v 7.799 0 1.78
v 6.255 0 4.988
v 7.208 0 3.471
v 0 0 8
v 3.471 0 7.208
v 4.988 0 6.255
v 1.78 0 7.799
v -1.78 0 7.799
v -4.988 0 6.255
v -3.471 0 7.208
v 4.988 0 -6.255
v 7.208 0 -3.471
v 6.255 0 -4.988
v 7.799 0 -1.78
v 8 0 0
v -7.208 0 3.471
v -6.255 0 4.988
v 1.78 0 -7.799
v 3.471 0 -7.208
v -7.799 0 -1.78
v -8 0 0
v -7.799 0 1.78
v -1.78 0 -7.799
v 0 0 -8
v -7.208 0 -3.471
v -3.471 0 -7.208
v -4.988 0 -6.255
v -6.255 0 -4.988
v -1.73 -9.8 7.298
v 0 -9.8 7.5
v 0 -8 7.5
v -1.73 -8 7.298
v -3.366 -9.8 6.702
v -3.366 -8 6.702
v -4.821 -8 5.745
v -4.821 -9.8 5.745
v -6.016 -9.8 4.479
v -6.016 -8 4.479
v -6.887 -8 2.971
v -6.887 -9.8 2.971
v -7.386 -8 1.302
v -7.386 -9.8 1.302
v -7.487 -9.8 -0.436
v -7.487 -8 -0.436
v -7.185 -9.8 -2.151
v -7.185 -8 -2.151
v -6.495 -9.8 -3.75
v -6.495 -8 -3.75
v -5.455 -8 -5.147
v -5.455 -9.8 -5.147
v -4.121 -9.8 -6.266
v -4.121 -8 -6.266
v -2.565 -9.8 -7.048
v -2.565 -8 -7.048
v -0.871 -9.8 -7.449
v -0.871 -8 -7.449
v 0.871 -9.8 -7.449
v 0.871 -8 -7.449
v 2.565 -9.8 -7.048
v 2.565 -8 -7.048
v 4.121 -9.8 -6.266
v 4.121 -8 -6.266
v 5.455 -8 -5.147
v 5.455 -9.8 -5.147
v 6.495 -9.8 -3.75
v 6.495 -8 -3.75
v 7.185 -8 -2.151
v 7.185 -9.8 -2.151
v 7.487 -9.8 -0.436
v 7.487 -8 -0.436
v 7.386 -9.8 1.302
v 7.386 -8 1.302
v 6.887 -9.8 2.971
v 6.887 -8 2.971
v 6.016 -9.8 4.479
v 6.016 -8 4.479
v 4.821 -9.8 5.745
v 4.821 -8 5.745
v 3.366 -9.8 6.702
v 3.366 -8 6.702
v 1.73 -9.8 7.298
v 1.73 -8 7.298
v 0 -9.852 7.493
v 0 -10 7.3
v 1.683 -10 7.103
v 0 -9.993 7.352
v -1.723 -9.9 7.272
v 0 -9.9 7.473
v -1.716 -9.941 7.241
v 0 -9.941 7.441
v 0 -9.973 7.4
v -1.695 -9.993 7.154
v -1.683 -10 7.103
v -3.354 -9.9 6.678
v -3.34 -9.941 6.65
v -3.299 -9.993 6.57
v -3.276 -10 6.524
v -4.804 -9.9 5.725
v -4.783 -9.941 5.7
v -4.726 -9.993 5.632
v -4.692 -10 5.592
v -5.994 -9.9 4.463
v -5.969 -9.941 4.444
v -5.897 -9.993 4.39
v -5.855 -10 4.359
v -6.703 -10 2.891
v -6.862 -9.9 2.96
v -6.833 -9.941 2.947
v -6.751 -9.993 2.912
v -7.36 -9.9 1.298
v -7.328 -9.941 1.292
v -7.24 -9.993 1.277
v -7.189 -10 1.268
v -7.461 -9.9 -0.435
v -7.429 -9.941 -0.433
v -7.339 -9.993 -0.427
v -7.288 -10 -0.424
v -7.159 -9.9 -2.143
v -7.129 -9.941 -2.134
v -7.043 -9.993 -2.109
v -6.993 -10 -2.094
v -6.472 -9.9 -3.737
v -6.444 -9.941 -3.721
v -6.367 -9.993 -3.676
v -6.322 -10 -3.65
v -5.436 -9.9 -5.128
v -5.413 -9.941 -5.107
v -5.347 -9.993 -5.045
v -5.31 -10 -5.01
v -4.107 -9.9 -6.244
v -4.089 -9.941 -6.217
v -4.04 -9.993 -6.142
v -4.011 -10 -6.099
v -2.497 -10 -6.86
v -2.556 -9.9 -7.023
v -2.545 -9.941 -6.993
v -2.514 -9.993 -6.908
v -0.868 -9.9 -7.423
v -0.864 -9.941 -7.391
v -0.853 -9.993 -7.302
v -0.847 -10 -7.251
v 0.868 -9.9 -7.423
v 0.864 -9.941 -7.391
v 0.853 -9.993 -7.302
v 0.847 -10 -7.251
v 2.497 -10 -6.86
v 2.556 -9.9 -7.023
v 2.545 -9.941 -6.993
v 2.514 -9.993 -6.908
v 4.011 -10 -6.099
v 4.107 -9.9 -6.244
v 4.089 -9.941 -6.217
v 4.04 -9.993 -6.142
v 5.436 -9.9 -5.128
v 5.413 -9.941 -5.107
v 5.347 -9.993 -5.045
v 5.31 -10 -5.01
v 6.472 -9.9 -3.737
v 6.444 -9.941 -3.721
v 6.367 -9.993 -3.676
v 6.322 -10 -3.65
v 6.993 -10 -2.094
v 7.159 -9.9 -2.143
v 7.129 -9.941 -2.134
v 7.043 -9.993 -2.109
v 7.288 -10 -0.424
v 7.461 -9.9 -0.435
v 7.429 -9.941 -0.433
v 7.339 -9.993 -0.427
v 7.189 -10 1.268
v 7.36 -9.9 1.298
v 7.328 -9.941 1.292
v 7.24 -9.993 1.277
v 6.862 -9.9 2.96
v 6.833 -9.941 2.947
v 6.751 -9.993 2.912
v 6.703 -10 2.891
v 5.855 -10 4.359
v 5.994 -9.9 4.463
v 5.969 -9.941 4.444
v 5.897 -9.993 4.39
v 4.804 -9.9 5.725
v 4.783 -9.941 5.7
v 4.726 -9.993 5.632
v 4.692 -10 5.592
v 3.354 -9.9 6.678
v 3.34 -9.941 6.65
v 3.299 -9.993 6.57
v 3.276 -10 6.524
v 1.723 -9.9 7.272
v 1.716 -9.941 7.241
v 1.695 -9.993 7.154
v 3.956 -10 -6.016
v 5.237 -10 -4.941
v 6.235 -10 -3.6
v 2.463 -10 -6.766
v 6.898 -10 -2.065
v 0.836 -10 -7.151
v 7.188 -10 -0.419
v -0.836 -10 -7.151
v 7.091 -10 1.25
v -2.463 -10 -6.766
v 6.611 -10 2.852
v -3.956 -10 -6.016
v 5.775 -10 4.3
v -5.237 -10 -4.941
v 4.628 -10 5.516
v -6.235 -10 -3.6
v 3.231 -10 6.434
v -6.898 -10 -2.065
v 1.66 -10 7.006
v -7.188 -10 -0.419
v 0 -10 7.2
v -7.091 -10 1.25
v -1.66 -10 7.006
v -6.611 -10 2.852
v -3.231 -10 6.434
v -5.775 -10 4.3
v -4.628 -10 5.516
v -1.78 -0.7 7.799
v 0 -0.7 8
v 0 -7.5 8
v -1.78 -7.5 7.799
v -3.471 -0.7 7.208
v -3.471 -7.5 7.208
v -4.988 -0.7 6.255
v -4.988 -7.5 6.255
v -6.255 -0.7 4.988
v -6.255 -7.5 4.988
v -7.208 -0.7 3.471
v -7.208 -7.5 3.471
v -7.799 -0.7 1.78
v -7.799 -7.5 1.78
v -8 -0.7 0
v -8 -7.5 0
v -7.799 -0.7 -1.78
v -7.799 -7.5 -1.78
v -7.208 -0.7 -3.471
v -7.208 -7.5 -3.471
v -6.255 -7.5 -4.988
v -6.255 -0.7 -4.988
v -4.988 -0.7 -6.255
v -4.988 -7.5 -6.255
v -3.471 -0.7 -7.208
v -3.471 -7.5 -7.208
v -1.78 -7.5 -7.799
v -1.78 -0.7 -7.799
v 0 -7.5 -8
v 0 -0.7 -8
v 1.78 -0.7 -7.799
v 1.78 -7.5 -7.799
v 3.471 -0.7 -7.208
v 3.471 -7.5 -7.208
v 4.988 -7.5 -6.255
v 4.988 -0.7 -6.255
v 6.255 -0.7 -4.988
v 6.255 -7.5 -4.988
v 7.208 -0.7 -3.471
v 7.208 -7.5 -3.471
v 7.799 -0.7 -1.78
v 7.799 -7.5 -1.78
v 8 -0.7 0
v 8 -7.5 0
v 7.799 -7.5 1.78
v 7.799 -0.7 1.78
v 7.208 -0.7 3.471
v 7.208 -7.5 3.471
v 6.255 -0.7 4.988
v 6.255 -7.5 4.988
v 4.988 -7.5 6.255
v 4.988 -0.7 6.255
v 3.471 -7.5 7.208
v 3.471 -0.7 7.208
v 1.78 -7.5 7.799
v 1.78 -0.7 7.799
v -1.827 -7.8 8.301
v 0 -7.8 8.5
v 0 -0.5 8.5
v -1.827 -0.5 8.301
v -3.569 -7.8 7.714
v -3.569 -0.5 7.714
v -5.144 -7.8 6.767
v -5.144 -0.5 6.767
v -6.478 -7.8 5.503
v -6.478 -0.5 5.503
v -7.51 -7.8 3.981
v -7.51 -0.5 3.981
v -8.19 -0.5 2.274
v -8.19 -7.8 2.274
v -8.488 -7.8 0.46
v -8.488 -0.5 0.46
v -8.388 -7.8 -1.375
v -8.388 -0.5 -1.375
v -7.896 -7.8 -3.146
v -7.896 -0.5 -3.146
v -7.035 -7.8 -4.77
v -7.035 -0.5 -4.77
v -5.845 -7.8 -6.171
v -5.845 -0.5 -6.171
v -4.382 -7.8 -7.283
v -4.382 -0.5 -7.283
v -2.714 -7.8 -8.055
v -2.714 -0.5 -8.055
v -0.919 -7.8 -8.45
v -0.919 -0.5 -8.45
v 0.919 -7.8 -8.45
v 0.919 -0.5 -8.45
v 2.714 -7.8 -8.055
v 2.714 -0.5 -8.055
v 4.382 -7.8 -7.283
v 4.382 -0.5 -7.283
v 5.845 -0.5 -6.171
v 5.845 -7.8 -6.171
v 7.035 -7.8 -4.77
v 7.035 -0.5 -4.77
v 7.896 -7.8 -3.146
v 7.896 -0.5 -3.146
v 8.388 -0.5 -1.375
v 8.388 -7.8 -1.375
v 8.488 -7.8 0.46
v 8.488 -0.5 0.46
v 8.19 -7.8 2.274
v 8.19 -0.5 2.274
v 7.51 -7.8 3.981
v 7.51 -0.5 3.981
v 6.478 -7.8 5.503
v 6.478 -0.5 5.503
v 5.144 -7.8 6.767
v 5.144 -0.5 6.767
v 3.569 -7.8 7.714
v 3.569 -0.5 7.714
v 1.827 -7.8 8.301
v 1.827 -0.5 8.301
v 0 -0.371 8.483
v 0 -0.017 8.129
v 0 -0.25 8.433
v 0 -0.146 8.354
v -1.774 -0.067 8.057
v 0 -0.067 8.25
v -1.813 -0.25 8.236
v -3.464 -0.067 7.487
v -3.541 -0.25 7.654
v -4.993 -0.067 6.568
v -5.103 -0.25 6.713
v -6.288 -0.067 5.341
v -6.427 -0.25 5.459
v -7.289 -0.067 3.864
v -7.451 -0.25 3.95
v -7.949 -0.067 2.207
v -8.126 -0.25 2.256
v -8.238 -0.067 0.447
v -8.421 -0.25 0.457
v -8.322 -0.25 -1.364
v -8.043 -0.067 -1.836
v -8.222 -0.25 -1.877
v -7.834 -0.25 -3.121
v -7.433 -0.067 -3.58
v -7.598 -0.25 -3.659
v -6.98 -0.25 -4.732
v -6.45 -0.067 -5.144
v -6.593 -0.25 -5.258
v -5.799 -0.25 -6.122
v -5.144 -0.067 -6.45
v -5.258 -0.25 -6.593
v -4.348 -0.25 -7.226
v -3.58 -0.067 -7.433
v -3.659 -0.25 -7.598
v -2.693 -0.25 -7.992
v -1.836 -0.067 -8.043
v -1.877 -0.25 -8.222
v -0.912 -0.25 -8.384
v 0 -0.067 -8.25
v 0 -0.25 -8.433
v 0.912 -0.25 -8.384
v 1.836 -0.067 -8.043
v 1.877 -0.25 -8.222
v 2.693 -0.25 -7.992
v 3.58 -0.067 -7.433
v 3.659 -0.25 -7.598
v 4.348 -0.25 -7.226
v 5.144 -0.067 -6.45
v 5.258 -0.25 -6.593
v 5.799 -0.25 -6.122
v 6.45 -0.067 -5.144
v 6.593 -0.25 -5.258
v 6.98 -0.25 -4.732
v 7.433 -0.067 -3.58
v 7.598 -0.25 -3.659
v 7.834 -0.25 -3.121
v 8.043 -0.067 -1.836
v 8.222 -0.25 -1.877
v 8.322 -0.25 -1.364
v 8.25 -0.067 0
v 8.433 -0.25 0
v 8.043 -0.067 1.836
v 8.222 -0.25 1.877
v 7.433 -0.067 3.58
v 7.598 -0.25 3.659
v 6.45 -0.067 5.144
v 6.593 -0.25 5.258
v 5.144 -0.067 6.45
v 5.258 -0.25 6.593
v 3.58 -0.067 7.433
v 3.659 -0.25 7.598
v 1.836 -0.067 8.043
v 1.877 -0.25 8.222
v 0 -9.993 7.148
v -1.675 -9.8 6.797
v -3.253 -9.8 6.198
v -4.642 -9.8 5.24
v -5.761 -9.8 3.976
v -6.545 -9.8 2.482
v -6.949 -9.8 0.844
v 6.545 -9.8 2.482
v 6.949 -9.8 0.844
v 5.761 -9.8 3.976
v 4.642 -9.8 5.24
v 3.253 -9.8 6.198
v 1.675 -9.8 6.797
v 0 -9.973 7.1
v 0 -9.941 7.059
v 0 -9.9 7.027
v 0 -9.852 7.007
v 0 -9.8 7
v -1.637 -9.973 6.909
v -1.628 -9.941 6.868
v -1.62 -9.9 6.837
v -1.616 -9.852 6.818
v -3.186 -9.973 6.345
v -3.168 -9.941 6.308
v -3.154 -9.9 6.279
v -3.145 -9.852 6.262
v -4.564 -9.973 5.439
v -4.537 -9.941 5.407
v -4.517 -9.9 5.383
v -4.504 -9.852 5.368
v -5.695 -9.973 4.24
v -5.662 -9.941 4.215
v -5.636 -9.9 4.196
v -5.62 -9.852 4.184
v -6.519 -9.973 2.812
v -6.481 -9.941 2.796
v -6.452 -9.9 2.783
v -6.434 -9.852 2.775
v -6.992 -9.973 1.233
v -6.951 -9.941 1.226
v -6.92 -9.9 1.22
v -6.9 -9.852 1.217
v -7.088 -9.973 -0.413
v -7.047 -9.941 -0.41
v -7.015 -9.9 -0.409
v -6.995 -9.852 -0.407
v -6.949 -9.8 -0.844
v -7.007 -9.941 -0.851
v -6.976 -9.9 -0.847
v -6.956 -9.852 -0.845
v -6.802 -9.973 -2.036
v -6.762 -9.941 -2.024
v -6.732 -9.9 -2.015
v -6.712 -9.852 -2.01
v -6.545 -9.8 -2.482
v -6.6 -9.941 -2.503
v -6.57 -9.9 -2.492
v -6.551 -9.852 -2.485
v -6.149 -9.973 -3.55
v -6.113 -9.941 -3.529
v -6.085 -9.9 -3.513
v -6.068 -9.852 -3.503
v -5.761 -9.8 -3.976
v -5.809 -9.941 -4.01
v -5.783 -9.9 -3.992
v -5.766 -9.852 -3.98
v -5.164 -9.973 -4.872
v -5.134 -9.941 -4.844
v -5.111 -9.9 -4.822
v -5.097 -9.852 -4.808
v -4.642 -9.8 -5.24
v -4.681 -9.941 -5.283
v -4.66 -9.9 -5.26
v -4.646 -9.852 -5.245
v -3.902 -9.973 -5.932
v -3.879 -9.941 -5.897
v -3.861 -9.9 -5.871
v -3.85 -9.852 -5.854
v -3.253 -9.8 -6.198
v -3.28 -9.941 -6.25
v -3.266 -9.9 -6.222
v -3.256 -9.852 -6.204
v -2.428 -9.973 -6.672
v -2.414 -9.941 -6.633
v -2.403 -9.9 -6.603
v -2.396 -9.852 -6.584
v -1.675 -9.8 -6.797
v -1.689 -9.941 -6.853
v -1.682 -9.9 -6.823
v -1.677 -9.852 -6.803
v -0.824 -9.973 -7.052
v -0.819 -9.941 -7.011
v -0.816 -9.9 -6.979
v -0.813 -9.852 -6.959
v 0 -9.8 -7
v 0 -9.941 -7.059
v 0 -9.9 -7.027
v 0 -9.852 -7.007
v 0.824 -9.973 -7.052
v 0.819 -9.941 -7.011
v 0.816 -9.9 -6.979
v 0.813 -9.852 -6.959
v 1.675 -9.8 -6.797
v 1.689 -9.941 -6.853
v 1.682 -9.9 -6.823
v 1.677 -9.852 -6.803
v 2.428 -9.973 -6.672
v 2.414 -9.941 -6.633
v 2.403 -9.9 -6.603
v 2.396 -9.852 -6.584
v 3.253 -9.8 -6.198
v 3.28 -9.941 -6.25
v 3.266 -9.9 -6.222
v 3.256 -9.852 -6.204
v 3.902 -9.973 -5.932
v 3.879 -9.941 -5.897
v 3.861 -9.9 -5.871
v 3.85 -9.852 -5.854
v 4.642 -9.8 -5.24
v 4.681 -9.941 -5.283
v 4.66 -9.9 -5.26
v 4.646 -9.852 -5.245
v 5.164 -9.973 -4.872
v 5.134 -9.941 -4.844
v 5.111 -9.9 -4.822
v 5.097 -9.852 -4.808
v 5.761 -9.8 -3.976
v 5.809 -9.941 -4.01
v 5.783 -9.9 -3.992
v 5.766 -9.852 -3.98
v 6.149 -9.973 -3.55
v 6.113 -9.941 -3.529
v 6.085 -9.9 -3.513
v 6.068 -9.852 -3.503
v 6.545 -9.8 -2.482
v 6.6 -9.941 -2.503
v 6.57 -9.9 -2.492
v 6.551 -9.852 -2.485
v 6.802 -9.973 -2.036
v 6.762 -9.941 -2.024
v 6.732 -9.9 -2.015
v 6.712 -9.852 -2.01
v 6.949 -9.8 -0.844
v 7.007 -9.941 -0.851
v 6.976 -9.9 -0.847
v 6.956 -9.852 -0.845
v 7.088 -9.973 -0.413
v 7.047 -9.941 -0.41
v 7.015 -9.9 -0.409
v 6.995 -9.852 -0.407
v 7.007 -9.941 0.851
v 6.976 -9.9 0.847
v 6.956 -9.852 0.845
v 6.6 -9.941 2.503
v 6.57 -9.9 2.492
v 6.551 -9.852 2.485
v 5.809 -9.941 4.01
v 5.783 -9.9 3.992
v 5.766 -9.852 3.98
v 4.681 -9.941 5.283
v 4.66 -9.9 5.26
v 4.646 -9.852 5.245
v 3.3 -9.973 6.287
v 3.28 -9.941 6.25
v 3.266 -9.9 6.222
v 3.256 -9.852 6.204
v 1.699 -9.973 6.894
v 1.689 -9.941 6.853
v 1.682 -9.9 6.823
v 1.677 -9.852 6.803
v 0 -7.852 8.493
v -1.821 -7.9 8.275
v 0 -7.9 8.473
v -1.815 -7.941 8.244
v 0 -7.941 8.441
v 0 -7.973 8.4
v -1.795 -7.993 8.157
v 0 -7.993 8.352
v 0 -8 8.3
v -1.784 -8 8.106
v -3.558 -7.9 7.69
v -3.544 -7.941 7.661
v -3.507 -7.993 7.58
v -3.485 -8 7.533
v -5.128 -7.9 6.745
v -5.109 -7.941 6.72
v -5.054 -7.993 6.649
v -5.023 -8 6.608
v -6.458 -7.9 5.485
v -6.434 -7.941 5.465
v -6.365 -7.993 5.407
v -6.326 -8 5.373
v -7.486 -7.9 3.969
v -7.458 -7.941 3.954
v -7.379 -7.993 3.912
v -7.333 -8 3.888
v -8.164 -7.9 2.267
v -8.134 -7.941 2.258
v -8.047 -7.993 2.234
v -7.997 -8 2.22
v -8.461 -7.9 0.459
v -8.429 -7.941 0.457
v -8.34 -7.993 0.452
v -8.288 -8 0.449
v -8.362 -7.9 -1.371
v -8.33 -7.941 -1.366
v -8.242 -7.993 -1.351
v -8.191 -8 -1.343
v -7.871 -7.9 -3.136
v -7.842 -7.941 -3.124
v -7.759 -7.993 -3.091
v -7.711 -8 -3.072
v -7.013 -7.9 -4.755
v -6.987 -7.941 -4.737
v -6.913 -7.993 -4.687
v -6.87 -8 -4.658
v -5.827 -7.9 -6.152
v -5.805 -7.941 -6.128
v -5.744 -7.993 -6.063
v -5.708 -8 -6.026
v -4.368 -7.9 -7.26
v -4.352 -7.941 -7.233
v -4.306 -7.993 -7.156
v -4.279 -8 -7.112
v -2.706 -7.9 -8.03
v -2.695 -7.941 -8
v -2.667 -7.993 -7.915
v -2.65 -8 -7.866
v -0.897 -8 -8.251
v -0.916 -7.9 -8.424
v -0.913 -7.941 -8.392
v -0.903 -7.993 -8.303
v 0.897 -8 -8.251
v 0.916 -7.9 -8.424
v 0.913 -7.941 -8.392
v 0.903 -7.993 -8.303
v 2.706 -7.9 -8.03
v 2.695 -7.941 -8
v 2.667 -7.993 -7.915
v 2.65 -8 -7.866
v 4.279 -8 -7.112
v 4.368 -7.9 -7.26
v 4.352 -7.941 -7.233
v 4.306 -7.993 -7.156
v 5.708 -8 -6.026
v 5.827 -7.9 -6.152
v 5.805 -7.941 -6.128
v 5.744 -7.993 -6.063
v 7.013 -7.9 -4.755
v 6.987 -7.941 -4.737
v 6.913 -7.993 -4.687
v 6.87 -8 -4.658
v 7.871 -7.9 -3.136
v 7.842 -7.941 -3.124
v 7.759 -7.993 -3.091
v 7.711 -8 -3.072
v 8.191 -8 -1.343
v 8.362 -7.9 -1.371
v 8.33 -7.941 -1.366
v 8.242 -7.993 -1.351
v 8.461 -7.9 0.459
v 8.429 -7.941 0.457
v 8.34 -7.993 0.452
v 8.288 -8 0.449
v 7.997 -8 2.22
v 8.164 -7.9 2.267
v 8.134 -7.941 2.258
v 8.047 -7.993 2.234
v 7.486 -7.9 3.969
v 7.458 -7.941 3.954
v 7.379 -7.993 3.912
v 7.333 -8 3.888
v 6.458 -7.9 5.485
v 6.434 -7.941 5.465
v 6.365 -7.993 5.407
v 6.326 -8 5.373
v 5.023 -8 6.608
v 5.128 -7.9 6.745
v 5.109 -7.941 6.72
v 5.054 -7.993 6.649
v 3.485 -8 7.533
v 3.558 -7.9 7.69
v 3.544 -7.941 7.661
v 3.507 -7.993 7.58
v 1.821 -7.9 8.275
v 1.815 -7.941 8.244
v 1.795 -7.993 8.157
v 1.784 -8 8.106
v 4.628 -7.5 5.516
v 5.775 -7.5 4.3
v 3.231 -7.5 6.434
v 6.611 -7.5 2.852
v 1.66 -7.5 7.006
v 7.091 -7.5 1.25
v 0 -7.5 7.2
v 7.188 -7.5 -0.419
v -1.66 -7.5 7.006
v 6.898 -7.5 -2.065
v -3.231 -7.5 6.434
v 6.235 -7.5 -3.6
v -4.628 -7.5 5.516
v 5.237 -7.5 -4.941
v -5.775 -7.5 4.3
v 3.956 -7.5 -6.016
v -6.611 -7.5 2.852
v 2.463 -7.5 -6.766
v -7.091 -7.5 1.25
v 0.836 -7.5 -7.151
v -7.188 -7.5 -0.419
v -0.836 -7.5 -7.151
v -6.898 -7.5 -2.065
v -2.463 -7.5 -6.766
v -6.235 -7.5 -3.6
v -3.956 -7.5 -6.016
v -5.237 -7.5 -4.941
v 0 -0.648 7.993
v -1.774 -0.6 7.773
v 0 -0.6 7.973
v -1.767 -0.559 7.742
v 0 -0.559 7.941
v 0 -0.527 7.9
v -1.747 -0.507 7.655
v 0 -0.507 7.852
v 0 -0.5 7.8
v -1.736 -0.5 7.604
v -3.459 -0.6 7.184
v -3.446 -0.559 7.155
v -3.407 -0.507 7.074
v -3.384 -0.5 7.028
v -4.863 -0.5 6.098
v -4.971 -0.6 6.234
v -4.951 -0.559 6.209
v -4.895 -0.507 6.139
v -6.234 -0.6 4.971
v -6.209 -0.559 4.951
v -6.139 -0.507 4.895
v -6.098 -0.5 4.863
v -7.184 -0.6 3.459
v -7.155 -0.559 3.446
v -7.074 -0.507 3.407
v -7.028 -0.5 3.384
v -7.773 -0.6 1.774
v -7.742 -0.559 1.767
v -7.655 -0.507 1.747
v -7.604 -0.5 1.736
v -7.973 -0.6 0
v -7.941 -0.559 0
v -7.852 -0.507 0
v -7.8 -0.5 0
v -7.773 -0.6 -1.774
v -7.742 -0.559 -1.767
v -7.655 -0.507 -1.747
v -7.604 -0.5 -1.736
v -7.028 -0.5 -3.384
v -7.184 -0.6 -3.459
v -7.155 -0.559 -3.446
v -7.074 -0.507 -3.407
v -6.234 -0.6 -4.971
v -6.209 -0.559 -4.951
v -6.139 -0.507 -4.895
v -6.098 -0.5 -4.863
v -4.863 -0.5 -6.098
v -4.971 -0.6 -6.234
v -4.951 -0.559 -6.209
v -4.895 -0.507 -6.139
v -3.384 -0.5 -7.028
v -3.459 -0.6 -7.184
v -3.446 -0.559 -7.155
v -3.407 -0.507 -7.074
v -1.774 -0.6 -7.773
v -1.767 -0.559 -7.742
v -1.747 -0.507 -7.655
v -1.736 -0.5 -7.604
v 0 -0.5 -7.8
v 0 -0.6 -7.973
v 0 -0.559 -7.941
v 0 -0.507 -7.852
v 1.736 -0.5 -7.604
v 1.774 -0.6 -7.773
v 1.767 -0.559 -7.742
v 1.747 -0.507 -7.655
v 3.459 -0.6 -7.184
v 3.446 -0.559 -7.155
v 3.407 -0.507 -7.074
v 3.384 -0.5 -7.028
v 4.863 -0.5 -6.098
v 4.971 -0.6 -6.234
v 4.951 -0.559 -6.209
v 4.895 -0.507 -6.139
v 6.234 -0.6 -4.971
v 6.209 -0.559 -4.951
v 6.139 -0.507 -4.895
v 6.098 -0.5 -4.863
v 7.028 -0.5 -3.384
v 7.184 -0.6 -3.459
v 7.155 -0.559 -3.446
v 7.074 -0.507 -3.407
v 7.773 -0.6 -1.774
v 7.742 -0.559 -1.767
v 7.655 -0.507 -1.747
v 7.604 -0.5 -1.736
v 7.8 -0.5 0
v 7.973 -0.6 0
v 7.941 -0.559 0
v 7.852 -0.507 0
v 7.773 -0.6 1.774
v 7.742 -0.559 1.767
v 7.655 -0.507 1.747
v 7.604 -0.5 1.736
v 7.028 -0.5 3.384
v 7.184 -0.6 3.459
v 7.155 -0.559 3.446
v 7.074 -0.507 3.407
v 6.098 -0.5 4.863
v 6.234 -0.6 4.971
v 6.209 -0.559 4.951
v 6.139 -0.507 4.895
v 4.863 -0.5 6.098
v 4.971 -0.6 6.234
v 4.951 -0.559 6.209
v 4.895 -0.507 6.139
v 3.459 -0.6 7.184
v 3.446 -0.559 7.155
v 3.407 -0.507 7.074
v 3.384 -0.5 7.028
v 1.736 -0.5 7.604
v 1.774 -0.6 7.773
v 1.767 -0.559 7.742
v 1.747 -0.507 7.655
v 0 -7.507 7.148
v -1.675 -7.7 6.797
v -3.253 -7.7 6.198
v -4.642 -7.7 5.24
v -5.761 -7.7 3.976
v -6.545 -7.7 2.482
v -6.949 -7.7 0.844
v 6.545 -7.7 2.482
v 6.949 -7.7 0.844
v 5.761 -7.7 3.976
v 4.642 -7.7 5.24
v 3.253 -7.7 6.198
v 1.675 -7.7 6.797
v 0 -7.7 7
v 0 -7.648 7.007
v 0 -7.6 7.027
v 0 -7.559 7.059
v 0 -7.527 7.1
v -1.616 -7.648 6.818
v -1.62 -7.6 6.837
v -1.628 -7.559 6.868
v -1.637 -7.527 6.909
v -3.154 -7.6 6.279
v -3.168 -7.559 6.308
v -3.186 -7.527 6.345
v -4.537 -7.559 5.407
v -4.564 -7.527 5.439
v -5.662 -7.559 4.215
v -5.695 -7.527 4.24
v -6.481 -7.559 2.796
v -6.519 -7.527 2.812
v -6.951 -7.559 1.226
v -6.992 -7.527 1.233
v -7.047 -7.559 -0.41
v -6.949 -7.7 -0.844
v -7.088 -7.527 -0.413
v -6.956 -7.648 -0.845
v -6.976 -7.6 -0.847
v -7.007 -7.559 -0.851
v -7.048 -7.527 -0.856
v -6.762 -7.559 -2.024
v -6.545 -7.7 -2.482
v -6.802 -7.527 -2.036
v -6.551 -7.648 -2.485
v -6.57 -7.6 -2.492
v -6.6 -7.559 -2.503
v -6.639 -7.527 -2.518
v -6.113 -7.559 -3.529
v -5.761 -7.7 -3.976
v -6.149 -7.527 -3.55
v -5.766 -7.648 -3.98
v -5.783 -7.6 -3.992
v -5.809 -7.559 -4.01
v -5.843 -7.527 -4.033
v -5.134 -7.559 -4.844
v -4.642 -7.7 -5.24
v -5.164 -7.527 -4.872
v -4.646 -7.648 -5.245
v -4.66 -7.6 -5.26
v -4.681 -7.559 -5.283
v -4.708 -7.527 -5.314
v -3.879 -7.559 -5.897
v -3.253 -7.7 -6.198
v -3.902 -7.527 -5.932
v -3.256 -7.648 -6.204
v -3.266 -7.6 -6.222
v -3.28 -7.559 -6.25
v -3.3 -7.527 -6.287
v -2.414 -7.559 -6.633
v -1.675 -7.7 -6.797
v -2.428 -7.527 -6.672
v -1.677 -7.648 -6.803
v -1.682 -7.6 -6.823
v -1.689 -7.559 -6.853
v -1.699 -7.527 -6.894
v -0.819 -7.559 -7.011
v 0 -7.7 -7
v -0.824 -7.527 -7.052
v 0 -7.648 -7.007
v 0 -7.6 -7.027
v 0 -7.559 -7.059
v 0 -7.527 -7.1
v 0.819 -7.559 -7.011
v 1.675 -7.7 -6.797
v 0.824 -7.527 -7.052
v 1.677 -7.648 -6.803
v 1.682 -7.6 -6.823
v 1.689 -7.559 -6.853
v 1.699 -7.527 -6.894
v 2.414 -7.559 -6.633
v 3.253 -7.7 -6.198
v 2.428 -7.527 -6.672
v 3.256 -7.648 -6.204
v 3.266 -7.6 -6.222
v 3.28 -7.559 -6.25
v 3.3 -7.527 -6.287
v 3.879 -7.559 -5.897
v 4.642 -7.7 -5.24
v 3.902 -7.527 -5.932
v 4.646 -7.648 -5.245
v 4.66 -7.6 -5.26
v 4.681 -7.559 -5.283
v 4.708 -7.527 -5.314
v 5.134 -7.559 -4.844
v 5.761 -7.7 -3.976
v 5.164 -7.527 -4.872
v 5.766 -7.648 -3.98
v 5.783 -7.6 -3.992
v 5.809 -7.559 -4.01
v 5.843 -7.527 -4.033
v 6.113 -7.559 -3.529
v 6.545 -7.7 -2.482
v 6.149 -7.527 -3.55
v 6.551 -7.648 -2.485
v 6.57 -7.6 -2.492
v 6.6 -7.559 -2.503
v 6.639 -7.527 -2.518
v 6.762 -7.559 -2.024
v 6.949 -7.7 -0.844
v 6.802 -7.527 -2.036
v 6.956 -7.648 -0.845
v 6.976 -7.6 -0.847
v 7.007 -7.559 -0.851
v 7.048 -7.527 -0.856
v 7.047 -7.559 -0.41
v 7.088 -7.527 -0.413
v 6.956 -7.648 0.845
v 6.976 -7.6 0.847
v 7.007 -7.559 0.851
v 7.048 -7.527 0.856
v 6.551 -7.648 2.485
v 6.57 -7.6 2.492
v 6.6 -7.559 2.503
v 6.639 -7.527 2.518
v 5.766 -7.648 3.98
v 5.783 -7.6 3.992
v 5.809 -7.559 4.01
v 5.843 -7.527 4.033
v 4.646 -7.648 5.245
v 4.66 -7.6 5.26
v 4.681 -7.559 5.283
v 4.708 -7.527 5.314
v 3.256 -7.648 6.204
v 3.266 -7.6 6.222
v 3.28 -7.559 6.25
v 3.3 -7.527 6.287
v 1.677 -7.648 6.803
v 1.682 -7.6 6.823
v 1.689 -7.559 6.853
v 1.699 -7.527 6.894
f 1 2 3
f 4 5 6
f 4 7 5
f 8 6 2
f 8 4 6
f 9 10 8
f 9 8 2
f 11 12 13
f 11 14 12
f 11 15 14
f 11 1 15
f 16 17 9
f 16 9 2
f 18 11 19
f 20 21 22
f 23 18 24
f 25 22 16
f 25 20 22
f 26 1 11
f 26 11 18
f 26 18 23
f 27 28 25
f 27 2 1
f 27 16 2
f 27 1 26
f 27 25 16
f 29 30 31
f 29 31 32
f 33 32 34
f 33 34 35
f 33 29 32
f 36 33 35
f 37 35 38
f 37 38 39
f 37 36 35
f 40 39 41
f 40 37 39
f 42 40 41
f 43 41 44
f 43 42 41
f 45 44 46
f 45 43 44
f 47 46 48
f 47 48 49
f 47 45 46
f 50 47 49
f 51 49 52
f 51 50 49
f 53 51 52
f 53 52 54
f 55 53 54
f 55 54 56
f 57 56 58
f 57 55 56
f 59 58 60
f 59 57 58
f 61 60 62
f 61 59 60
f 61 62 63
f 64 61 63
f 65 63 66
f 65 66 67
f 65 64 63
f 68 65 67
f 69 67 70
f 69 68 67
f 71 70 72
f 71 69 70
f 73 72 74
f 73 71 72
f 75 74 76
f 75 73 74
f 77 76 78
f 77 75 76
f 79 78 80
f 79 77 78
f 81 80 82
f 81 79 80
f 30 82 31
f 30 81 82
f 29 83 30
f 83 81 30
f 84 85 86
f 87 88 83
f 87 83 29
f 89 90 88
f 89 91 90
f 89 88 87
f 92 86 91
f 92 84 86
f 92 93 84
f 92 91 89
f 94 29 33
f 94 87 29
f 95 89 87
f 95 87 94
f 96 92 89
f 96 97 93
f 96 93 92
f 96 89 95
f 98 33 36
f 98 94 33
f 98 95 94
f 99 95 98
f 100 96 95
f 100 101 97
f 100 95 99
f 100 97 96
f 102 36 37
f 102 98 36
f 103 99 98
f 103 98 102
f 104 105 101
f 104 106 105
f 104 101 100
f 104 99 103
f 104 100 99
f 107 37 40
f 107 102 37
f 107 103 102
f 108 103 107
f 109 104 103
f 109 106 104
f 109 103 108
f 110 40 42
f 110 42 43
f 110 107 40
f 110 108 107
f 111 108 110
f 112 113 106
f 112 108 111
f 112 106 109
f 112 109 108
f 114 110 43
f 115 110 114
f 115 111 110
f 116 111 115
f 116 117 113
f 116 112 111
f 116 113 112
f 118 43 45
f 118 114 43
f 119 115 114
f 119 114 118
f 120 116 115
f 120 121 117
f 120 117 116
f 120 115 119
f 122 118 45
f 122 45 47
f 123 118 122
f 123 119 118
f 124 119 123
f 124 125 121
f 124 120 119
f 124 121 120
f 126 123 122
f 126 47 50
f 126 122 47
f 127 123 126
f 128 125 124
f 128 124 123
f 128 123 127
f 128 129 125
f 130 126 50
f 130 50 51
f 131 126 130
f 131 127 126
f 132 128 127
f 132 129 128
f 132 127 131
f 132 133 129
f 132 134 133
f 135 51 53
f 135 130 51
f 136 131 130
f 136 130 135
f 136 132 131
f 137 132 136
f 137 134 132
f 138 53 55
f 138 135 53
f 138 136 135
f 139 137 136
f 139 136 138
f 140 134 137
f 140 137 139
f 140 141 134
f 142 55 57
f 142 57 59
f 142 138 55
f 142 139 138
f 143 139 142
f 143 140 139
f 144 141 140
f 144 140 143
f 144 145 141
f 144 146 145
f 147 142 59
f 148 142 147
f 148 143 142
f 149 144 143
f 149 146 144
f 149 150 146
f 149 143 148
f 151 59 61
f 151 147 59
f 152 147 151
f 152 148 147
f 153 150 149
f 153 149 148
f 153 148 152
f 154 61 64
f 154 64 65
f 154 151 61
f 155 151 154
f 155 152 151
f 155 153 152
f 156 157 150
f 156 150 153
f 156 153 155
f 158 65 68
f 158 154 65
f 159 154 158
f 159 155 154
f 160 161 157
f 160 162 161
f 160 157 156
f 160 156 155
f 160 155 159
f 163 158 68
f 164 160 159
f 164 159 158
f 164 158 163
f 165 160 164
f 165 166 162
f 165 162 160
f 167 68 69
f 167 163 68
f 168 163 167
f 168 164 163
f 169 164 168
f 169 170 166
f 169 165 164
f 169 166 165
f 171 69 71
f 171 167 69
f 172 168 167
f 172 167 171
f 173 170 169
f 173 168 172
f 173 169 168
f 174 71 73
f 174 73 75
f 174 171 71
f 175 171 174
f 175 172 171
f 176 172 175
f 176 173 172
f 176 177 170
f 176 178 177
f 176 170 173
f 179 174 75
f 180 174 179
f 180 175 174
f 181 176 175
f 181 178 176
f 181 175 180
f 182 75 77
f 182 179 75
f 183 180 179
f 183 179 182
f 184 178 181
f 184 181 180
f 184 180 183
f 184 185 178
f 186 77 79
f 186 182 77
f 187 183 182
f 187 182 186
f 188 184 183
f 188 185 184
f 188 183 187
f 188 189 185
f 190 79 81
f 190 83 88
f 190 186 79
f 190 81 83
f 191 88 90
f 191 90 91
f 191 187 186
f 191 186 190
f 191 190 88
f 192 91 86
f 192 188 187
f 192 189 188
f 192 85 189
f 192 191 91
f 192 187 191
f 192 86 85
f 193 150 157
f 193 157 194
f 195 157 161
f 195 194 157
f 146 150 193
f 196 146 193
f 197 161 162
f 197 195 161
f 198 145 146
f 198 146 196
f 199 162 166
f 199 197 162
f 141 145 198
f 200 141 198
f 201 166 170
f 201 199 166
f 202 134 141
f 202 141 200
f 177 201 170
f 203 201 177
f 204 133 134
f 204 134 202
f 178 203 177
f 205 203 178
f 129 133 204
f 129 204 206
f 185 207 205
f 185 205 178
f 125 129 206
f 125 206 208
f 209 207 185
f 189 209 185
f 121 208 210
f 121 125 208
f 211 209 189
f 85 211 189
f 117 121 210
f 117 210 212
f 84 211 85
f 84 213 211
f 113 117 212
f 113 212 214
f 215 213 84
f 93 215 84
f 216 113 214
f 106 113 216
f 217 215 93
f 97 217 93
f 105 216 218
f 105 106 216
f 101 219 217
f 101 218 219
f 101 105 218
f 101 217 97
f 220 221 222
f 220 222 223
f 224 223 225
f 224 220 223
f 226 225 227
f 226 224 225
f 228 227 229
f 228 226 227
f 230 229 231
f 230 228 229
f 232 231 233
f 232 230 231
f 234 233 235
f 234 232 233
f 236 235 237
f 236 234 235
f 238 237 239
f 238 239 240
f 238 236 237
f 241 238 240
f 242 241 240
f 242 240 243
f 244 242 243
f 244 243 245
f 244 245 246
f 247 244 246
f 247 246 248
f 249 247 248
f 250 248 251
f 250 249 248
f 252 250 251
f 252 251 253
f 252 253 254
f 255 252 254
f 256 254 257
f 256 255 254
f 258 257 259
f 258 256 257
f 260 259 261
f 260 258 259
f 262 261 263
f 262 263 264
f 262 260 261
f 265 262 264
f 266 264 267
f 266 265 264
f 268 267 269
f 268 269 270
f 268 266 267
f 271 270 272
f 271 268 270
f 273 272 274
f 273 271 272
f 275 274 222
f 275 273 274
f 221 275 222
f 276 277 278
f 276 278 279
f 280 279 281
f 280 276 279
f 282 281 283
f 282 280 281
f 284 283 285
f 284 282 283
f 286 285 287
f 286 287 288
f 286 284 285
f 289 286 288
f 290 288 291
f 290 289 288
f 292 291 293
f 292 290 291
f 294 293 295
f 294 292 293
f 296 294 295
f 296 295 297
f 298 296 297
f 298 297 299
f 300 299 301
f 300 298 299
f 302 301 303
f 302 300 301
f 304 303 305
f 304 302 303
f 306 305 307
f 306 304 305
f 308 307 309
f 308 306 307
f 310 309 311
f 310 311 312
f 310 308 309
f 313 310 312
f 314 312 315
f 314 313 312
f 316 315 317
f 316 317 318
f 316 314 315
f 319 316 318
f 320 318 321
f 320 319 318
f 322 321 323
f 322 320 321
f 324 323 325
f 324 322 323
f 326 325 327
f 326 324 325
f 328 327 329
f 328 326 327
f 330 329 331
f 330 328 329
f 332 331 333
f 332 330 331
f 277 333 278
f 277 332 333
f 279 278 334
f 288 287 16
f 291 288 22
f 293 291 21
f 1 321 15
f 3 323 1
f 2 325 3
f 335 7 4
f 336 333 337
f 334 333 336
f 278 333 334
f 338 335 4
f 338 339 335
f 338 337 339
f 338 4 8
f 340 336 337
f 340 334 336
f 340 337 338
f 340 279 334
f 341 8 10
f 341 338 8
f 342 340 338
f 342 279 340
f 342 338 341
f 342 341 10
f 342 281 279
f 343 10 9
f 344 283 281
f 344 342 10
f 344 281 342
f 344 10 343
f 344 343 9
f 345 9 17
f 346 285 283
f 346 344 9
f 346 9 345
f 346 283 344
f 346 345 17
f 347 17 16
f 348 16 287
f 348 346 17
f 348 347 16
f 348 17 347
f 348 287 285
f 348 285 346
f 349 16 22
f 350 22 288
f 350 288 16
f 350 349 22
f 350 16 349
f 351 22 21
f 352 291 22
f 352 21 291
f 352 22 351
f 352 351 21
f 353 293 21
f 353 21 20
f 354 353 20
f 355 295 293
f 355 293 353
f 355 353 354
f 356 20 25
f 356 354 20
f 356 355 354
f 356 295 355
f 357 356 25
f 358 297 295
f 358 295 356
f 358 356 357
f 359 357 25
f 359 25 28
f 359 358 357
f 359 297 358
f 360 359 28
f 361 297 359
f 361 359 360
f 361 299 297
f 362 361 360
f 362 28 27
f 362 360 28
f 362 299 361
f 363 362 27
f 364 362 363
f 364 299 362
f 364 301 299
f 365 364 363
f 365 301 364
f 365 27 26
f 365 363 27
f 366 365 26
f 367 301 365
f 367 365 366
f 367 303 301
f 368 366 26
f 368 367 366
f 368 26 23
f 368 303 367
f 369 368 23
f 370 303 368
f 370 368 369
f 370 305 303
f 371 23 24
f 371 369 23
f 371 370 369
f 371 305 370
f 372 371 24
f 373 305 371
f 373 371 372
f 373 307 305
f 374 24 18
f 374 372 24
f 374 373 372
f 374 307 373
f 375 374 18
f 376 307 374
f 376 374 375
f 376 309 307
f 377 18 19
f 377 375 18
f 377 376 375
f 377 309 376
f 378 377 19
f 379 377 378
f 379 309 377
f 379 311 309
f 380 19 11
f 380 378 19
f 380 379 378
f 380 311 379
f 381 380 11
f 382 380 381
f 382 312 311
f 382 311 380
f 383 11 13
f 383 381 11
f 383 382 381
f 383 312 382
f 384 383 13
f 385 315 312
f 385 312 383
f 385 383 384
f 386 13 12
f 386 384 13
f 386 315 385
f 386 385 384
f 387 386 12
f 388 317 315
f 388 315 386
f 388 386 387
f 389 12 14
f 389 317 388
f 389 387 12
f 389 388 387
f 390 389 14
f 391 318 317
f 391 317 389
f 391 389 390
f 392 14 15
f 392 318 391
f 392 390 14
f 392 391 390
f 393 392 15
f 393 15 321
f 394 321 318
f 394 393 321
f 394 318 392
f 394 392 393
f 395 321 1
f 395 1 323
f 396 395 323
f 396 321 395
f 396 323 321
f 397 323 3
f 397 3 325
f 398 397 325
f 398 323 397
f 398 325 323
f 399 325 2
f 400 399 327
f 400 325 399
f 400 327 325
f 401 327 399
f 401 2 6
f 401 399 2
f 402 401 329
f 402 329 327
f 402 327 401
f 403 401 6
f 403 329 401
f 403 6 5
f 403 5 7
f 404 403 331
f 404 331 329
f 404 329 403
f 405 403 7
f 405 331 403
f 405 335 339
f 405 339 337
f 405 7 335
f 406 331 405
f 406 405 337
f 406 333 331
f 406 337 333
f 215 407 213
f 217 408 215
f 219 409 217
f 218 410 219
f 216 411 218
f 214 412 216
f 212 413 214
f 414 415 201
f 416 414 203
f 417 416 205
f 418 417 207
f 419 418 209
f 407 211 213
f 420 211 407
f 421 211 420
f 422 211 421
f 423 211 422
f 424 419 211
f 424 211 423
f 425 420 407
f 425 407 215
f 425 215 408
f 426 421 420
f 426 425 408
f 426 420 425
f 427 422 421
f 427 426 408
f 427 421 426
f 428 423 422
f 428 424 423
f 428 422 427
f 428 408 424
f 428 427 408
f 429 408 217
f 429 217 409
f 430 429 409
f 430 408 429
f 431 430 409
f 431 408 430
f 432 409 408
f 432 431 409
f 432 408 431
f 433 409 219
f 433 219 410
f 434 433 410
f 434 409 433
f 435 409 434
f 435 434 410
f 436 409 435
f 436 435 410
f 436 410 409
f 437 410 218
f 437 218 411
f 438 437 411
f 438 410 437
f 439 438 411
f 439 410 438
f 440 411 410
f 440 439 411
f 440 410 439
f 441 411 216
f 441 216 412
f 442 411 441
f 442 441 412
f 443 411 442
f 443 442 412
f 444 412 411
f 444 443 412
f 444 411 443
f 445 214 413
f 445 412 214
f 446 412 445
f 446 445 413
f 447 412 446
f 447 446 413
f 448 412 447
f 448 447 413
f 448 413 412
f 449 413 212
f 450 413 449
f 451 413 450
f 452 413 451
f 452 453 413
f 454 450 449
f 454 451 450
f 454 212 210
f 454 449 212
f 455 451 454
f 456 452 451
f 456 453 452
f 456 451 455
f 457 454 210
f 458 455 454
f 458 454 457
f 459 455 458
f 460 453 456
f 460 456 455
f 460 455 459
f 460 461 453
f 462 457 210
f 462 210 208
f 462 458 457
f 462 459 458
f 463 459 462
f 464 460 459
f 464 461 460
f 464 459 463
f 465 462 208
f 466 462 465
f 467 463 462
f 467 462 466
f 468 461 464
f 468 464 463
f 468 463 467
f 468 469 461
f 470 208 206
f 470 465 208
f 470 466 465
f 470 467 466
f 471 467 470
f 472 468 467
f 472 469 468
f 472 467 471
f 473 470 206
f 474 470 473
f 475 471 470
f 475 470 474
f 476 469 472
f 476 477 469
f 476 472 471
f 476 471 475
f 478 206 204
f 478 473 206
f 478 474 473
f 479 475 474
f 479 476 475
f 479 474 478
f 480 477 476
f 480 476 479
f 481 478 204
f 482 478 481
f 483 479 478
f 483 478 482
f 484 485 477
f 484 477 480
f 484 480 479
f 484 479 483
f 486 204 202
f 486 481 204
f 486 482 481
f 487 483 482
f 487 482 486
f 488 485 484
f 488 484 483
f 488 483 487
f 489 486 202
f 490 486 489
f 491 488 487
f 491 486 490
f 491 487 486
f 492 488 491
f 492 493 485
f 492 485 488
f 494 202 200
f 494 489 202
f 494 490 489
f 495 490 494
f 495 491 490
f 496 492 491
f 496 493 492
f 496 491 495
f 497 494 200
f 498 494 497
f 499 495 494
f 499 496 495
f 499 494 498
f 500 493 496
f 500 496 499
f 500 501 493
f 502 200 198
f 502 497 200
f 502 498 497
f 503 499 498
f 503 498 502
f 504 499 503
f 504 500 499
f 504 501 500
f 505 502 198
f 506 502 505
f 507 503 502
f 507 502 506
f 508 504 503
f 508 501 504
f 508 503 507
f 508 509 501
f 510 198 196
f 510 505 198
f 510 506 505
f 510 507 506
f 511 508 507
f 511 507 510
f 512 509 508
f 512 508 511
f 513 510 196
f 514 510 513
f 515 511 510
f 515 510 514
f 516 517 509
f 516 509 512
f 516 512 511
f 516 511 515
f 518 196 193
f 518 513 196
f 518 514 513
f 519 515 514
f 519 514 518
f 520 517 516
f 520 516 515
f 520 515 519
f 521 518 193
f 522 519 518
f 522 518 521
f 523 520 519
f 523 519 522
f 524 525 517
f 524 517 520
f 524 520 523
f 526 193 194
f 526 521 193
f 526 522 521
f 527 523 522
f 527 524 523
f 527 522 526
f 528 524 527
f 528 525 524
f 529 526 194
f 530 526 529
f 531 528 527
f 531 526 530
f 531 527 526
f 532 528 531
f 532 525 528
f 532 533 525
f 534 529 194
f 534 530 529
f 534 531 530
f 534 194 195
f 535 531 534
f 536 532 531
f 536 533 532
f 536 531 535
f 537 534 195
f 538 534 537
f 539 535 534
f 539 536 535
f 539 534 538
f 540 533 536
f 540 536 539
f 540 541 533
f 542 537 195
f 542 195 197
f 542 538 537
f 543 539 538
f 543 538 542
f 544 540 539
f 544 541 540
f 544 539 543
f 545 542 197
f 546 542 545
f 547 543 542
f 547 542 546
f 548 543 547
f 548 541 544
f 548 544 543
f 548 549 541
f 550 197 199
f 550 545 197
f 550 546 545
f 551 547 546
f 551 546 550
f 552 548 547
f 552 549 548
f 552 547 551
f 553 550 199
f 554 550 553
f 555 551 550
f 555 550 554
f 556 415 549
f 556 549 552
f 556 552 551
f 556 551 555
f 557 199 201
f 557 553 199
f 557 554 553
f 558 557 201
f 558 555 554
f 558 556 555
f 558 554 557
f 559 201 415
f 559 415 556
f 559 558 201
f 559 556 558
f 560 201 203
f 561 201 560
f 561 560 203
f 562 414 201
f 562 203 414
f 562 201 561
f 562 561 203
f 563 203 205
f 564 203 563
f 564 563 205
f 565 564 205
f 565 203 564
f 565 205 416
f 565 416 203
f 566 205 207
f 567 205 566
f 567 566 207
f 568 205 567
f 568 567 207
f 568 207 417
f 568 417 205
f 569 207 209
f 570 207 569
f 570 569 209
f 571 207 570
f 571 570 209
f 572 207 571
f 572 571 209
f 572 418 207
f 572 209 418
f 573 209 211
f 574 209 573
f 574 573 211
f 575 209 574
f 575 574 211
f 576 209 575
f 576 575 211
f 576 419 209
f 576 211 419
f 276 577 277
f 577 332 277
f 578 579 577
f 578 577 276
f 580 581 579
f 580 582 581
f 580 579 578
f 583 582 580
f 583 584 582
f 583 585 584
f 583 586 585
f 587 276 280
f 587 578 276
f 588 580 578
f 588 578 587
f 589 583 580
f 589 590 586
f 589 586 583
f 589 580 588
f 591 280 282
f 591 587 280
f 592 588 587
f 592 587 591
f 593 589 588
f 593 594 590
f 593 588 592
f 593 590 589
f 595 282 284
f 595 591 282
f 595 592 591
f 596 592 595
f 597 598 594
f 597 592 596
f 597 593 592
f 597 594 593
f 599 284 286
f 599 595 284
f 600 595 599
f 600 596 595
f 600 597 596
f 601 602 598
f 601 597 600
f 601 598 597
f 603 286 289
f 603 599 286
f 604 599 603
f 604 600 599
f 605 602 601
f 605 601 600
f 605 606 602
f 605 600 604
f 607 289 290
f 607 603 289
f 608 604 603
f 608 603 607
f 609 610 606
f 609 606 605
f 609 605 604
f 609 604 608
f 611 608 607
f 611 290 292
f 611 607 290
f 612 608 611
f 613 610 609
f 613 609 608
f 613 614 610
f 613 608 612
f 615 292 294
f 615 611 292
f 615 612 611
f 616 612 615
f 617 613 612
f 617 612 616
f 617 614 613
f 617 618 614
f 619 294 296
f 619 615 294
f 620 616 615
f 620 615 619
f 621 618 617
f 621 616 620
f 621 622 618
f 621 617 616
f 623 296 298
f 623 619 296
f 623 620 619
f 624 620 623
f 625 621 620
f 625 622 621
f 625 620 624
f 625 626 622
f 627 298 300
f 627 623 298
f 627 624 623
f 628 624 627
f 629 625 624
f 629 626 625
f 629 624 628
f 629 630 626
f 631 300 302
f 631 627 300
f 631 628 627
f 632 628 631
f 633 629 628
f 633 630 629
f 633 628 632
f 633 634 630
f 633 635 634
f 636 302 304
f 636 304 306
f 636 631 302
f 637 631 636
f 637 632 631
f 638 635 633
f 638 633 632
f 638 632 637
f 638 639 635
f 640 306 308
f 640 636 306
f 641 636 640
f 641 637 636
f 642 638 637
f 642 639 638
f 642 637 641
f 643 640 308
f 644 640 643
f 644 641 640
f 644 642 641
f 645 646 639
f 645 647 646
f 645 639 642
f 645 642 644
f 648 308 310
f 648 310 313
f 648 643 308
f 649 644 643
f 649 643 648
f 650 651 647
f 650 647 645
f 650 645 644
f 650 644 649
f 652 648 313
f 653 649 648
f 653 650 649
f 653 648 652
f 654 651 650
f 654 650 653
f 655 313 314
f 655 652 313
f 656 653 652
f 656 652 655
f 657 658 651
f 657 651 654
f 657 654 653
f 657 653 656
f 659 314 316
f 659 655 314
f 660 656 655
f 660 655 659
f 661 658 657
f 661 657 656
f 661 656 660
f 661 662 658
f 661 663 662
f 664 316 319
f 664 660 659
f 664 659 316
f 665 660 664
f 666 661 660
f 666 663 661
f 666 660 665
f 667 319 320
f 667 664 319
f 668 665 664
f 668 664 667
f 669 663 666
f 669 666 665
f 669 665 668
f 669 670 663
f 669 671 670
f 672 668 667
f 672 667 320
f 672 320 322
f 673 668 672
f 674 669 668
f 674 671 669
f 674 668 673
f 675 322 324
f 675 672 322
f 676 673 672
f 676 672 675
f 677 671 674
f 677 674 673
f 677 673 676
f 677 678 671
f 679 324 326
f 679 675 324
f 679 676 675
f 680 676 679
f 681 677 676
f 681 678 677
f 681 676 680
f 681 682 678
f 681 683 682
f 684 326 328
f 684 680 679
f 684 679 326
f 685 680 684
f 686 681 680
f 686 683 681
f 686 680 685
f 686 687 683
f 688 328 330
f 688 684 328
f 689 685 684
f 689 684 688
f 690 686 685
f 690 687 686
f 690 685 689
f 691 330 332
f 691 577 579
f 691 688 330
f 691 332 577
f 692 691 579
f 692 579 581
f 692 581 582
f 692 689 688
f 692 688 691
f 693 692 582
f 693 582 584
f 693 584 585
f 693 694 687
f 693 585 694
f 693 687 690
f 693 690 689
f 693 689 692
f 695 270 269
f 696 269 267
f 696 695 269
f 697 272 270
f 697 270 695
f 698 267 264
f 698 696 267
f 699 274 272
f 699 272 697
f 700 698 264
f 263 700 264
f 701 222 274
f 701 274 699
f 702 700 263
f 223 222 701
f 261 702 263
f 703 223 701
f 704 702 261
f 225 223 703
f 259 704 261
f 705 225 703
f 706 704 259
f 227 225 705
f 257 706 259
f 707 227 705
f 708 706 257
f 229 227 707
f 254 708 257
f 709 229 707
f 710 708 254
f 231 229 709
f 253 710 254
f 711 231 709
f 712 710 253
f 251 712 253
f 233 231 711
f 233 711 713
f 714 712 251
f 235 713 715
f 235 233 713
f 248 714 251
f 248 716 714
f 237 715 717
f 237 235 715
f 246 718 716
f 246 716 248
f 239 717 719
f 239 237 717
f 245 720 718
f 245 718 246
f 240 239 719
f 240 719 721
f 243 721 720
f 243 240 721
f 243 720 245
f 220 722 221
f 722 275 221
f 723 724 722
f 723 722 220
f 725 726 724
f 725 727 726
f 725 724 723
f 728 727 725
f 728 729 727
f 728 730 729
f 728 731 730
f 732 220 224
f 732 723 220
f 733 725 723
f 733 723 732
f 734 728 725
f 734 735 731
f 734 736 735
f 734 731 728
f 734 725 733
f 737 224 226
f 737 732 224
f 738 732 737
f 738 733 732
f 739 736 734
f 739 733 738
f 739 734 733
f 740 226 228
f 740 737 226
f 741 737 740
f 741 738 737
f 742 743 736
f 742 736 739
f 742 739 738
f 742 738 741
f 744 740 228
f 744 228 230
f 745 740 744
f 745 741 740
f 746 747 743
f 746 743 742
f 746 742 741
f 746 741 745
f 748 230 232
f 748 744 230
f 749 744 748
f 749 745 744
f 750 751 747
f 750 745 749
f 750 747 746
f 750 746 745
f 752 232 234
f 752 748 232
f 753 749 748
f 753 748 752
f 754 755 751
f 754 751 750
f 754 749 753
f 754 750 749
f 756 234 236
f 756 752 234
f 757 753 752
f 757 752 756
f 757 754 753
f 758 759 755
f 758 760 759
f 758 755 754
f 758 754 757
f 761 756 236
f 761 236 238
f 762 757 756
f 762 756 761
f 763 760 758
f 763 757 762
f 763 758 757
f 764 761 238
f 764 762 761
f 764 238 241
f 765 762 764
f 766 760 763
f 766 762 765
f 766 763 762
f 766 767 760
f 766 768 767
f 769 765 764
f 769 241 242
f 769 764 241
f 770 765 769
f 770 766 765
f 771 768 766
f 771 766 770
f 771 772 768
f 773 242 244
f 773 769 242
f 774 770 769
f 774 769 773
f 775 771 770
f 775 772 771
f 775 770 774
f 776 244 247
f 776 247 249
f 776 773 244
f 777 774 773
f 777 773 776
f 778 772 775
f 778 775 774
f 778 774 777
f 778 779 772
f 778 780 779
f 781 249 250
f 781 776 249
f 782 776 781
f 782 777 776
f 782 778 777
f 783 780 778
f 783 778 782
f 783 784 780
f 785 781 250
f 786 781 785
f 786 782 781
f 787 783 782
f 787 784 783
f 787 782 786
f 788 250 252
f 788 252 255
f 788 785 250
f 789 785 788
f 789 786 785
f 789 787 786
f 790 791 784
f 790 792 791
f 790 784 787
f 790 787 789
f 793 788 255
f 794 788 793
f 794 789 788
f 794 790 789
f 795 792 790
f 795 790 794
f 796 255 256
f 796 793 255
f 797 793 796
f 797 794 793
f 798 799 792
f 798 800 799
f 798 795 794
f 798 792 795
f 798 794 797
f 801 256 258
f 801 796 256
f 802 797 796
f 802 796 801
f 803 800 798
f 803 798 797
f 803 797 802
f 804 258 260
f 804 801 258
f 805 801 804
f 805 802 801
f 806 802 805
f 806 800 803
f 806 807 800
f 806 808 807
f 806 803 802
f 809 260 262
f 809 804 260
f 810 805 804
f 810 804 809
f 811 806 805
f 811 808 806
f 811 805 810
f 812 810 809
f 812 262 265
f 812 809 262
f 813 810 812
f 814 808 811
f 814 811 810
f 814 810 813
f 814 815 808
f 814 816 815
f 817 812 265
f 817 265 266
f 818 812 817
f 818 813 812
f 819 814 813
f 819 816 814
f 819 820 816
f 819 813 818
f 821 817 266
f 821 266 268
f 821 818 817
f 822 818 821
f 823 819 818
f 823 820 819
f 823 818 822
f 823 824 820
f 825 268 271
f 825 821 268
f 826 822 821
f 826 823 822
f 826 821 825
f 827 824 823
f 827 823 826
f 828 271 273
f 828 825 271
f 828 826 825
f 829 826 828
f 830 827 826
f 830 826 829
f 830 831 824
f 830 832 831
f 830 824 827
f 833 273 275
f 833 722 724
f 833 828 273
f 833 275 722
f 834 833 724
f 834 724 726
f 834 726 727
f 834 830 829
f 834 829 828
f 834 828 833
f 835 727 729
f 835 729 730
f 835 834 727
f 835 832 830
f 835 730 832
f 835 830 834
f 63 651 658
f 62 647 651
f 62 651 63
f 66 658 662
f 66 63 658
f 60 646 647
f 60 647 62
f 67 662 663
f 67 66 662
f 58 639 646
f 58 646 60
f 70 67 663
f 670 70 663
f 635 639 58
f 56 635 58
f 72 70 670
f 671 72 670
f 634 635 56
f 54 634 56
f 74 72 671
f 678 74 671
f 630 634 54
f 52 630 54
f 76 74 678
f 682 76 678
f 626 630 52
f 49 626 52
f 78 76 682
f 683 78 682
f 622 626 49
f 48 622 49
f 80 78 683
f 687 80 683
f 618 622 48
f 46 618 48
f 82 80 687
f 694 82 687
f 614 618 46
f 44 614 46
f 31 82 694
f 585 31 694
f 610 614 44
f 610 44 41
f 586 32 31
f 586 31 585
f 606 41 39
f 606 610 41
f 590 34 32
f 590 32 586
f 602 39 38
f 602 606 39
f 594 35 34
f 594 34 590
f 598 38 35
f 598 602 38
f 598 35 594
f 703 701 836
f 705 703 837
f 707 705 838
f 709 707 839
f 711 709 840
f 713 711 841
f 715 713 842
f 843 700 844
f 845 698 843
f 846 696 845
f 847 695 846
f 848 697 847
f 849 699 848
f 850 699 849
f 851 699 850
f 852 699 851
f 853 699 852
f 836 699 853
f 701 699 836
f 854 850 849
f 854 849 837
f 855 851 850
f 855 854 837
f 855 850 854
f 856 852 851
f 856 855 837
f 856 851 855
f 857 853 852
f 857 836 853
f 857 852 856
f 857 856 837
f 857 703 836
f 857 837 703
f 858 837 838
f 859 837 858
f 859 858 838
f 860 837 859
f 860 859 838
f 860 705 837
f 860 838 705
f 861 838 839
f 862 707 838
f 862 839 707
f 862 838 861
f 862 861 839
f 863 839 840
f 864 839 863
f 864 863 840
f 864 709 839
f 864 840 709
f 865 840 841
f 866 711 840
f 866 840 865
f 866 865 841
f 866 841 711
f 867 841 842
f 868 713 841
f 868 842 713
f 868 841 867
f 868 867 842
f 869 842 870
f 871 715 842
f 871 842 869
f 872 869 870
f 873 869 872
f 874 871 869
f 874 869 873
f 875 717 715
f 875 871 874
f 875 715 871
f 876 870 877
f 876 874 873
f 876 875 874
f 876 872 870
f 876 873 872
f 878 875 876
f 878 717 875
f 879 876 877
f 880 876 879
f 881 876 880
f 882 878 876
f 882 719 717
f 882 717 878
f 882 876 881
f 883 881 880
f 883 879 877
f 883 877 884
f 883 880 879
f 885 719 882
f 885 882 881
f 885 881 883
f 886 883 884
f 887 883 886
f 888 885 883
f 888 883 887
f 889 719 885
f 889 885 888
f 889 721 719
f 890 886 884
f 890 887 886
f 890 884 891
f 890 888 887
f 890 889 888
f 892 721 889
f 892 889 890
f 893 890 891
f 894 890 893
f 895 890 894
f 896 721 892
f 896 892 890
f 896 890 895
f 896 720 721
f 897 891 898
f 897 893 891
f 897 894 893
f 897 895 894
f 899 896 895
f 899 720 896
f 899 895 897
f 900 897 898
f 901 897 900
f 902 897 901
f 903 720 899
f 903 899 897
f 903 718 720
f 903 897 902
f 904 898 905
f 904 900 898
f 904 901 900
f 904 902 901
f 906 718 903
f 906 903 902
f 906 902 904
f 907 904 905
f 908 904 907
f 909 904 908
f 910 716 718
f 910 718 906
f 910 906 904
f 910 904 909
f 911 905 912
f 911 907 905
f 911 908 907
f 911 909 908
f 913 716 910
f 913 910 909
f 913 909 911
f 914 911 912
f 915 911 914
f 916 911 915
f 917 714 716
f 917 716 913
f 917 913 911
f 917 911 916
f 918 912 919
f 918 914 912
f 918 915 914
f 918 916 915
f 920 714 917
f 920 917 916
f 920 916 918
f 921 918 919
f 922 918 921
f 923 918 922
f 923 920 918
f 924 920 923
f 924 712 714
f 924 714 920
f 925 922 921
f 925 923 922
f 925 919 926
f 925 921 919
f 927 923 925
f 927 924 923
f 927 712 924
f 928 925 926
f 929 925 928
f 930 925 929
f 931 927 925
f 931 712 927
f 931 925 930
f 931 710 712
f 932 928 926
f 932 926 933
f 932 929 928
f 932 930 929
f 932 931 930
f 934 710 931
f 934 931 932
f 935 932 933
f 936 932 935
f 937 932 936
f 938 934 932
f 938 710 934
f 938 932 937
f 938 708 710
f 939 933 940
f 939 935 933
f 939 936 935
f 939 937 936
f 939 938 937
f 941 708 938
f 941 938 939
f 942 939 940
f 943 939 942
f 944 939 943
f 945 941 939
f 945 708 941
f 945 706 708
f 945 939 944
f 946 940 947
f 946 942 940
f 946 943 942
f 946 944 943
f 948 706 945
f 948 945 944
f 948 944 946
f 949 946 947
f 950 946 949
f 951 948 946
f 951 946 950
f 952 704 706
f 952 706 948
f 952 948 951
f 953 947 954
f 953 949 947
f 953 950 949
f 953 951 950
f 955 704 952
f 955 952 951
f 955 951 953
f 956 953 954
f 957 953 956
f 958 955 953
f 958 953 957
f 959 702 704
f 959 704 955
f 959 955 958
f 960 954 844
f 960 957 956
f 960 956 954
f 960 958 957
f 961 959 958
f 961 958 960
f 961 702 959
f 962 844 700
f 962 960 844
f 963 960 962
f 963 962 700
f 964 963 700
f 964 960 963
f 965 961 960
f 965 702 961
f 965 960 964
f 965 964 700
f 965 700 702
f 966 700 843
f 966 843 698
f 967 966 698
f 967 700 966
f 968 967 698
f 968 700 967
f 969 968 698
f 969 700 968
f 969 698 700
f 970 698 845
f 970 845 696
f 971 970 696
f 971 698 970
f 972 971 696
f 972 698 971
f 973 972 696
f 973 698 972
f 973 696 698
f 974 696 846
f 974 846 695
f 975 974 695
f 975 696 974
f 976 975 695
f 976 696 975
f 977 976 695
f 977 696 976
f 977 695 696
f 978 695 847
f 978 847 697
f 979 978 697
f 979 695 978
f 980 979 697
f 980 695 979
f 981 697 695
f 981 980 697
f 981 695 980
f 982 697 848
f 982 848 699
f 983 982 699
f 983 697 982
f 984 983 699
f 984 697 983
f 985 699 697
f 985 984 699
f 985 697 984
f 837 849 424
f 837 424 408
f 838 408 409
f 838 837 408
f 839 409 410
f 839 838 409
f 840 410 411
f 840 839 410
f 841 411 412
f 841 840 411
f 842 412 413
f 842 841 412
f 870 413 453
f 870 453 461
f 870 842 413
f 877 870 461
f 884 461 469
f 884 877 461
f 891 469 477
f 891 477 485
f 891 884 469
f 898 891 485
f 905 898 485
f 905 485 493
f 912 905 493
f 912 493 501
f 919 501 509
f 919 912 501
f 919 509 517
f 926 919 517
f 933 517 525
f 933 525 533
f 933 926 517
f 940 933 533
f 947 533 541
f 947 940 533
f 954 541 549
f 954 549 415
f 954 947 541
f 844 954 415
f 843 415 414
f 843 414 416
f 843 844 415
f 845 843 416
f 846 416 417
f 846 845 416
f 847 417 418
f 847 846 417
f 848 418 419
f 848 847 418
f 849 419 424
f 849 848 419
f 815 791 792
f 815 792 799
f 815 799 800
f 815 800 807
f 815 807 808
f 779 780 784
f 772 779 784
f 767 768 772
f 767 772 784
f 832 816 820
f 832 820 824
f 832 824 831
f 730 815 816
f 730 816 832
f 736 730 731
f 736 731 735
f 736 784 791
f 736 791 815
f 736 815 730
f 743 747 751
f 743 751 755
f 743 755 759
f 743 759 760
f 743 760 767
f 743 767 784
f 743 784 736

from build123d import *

# Parameters (mm, degrees)
FILLET1_R = 0.5
FILLET2_R = 0.2


with BuildPart() as part:
    # Sketch1 → Revolve1 (revolve)
    with BuildSketch(Plane(origin=(0, 0, 0), x_dir=(0, 0, -1), z_dir=(1, 0, 0))):
        Polygon((0, 0), (-8.5, 0), (-8.5, -8), (-7.5, -8), (-7.5, -10), (-7, -10), (-7, -7.5), (-8, -7.5), (-8, -0.5), (0, -0.5), align=None)
    revolve(axis=Axis((0, 0, 0), (0, -1, 0)))

    # Fillet1
    fillet1_edges = [part.edges().sort_by_distance(p)[0] for p in [
        (0, 0, -8.5),
    ]]
    fillet(fillet1_edges, radius=FILLET1_R)

    # Fillet2
    fillet2_edges = [part.edges().sort_by_distance(p)[0] for p in [
        (0, -0.5, -8),
        (0, -8, -8.5),
        (0, -10, -7.5),
        (0, -10, -7),
        (0, -7.5, -7),
    ]]
    fillet(fillet2_edges, radius=FILLET2_R)


solid = part.part
